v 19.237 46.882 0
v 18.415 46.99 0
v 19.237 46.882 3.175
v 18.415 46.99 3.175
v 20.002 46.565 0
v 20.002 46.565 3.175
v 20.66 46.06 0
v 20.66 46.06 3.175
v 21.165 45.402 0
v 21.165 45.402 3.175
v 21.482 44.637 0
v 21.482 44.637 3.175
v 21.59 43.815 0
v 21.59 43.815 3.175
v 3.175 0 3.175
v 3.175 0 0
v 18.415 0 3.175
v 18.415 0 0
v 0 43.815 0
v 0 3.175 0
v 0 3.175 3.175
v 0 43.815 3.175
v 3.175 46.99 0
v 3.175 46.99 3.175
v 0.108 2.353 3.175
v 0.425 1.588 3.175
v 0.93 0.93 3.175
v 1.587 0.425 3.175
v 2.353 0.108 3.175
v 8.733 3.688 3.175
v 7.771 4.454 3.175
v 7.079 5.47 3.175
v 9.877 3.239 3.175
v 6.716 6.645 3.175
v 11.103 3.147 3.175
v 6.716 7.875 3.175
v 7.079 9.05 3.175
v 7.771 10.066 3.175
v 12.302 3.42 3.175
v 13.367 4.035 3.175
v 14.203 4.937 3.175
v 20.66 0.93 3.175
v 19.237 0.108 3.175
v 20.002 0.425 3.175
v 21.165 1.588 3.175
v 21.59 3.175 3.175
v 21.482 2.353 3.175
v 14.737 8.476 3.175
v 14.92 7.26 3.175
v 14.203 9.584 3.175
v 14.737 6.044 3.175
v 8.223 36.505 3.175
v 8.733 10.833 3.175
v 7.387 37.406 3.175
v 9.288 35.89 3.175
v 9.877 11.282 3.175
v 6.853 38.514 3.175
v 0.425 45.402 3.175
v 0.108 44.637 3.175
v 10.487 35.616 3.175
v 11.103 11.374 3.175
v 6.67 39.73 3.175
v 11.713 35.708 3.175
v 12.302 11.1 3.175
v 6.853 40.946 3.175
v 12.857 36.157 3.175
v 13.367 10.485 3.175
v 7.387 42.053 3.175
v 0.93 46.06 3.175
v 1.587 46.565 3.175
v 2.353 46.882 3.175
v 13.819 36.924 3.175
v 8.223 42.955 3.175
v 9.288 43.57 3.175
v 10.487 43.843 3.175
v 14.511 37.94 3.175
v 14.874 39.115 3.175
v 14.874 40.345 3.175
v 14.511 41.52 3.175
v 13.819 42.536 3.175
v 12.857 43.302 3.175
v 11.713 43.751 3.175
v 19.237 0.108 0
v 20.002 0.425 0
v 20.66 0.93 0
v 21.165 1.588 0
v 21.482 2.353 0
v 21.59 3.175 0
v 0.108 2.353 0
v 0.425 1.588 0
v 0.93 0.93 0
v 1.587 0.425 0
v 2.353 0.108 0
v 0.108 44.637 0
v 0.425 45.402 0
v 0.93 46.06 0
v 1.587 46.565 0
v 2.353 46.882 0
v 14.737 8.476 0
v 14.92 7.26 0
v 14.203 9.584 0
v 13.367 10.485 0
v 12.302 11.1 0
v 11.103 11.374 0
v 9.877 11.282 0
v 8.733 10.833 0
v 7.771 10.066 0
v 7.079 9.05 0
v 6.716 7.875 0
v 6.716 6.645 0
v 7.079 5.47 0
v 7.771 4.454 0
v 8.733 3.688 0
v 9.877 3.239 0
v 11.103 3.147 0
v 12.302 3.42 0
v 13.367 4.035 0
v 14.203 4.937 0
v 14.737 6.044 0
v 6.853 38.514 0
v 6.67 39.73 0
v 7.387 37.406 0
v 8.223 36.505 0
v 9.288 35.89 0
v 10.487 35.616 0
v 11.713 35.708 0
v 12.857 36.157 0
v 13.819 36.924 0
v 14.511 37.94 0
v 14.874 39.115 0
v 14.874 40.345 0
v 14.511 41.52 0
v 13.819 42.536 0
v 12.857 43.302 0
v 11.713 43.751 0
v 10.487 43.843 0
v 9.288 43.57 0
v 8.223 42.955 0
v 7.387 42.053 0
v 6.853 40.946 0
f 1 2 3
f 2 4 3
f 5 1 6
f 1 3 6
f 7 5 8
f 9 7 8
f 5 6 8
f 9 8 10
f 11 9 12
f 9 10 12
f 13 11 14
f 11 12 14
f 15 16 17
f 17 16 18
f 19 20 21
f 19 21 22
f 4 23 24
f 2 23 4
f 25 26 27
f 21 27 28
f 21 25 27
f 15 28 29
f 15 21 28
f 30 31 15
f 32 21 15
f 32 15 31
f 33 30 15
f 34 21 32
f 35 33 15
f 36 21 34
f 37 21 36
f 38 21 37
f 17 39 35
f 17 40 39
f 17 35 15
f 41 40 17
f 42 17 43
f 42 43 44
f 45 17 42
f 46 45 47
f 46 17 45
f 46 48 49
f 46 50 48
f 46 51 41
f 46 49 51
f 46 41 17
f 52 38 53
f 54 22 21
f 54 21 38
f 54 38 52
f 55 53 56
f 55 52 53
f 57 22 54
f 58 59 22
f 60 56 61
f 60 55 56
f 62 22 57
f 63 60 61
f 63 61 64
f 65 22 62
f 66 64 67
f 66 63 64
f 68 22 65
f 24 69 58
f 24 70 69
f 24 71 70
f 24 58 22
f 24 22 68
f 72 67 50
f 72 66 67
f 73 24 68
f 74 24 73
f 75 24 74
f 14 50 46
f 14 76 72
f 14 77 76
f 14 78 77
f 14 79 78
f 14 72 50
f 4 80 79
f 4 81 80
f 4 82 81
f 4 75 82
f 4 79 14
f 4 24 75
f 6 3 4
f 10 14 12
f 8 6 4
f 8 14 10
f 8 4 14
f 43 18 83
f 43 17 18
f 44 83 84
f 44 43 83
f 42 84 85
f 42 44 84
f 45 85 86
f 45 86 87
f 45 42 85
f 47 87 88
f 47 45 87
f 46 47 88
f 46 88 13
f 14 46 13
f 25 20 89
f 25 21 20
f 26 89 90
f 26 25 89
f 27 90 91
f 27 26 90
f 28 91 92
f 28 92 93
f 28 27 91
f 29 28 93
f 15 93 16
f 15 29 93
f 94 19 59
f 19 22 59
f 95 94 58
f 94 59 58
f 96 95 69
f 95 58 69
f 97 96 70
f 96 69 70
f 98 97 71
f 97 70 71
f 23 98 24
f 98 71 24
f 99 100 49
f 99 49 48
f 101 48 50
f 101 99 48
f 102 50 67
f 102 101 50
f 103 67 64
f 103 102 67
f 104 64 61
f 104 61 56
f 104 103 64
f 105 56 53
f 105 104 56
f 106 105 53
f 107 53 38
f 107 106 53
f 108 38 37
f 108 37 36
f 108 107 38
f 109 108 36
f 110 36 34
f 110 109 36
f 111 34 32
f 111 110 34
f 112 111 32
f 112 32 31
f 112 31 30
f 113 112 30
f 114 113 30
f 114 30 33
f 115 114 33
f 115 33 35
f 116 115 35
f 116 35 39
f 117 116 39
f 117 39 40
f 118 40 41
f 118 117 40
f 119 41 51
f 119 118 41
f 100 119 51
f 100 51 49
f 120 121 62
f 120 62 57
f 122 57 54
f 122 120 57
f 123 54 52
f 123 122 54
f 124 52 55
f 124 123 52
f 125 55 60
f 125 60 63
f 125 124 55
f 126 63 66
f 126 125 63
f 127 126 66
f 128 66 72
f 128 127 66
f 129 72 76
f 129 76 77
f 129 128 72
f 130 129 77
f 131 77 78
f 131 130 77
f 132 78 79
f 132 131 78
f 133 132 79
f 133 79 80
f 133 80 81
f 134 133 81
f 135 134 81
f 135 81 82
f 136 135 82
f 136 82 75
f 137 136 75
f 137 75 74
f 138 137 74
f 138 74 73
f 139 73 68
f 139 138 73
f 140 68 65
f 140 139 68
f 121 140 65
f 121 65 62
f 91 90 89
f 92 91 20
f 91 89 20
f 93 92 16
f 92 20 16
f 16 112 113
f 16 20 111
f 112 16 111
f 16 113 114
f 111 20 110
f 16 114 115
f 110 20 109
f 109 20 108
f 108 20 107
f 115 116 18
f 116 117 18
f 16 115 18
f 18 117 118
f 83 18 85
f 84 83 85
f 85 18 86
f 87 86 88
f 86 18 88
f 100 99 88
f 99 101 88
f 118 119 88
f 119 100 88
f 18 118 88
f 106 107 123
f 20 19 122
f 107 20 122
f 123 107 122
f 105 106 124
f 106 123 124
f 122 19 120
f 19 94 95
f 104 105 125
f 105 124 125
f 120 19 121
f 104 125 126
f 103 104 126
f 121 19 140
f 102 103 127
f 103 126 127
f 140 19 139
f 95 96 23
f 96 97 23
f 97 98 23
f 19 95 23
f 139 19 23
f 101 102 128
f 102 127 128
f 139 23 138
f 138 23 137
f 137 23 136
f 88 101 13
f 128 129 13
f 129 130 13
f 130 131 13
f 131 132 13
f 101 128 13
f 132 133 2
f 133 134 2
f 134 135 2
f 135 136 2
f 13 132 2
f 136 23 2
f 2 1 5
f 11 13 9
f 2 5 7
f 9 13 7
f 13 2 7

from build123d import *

# Parameters (mm, degrees)
SKETCH1_W           = 21.59
SKETCH1_H           = 46.99
SKETCH1_R           = 4.124999878
BOSS_EXTRUDE1_DEPTH = 3.175
FILLET1_R           = 3.175


with BuildPart() as part:
    # Sketch1 → Boss-Extrude1 (new body)
    with BuildSketch(Plane.XY):
        with Locations((10.795, 23.495)):
            Rectangle(SKETCH1_W, SKETCH1_H)
        with Locations((10.795, 7.260198401)):
            Circle(SKETCH1_R, mode=Mode.SUBTRACT)
        with Locations(Location((10.795, 39.729801599, 0), (0, 0, 180))):
            Circle(SKETCH1_R, mode=Mode.SUBTRACT)
    extrude(amount=BOSS_EXTRUDE1_DEPTH)

    # Fillet1
    fillet1_edges = [part.edges().sort_by_distance(p)[0] for p in [
        (0, 0, 1.5875),
        (21.59, 0, 1.5875),
        (21.59, 46.99, 1.5875),
        (0, 46.99, 1.5875),
    ]]
    fillet(fillet1_edges, radius=FILLET1_R)


solid = part.part
